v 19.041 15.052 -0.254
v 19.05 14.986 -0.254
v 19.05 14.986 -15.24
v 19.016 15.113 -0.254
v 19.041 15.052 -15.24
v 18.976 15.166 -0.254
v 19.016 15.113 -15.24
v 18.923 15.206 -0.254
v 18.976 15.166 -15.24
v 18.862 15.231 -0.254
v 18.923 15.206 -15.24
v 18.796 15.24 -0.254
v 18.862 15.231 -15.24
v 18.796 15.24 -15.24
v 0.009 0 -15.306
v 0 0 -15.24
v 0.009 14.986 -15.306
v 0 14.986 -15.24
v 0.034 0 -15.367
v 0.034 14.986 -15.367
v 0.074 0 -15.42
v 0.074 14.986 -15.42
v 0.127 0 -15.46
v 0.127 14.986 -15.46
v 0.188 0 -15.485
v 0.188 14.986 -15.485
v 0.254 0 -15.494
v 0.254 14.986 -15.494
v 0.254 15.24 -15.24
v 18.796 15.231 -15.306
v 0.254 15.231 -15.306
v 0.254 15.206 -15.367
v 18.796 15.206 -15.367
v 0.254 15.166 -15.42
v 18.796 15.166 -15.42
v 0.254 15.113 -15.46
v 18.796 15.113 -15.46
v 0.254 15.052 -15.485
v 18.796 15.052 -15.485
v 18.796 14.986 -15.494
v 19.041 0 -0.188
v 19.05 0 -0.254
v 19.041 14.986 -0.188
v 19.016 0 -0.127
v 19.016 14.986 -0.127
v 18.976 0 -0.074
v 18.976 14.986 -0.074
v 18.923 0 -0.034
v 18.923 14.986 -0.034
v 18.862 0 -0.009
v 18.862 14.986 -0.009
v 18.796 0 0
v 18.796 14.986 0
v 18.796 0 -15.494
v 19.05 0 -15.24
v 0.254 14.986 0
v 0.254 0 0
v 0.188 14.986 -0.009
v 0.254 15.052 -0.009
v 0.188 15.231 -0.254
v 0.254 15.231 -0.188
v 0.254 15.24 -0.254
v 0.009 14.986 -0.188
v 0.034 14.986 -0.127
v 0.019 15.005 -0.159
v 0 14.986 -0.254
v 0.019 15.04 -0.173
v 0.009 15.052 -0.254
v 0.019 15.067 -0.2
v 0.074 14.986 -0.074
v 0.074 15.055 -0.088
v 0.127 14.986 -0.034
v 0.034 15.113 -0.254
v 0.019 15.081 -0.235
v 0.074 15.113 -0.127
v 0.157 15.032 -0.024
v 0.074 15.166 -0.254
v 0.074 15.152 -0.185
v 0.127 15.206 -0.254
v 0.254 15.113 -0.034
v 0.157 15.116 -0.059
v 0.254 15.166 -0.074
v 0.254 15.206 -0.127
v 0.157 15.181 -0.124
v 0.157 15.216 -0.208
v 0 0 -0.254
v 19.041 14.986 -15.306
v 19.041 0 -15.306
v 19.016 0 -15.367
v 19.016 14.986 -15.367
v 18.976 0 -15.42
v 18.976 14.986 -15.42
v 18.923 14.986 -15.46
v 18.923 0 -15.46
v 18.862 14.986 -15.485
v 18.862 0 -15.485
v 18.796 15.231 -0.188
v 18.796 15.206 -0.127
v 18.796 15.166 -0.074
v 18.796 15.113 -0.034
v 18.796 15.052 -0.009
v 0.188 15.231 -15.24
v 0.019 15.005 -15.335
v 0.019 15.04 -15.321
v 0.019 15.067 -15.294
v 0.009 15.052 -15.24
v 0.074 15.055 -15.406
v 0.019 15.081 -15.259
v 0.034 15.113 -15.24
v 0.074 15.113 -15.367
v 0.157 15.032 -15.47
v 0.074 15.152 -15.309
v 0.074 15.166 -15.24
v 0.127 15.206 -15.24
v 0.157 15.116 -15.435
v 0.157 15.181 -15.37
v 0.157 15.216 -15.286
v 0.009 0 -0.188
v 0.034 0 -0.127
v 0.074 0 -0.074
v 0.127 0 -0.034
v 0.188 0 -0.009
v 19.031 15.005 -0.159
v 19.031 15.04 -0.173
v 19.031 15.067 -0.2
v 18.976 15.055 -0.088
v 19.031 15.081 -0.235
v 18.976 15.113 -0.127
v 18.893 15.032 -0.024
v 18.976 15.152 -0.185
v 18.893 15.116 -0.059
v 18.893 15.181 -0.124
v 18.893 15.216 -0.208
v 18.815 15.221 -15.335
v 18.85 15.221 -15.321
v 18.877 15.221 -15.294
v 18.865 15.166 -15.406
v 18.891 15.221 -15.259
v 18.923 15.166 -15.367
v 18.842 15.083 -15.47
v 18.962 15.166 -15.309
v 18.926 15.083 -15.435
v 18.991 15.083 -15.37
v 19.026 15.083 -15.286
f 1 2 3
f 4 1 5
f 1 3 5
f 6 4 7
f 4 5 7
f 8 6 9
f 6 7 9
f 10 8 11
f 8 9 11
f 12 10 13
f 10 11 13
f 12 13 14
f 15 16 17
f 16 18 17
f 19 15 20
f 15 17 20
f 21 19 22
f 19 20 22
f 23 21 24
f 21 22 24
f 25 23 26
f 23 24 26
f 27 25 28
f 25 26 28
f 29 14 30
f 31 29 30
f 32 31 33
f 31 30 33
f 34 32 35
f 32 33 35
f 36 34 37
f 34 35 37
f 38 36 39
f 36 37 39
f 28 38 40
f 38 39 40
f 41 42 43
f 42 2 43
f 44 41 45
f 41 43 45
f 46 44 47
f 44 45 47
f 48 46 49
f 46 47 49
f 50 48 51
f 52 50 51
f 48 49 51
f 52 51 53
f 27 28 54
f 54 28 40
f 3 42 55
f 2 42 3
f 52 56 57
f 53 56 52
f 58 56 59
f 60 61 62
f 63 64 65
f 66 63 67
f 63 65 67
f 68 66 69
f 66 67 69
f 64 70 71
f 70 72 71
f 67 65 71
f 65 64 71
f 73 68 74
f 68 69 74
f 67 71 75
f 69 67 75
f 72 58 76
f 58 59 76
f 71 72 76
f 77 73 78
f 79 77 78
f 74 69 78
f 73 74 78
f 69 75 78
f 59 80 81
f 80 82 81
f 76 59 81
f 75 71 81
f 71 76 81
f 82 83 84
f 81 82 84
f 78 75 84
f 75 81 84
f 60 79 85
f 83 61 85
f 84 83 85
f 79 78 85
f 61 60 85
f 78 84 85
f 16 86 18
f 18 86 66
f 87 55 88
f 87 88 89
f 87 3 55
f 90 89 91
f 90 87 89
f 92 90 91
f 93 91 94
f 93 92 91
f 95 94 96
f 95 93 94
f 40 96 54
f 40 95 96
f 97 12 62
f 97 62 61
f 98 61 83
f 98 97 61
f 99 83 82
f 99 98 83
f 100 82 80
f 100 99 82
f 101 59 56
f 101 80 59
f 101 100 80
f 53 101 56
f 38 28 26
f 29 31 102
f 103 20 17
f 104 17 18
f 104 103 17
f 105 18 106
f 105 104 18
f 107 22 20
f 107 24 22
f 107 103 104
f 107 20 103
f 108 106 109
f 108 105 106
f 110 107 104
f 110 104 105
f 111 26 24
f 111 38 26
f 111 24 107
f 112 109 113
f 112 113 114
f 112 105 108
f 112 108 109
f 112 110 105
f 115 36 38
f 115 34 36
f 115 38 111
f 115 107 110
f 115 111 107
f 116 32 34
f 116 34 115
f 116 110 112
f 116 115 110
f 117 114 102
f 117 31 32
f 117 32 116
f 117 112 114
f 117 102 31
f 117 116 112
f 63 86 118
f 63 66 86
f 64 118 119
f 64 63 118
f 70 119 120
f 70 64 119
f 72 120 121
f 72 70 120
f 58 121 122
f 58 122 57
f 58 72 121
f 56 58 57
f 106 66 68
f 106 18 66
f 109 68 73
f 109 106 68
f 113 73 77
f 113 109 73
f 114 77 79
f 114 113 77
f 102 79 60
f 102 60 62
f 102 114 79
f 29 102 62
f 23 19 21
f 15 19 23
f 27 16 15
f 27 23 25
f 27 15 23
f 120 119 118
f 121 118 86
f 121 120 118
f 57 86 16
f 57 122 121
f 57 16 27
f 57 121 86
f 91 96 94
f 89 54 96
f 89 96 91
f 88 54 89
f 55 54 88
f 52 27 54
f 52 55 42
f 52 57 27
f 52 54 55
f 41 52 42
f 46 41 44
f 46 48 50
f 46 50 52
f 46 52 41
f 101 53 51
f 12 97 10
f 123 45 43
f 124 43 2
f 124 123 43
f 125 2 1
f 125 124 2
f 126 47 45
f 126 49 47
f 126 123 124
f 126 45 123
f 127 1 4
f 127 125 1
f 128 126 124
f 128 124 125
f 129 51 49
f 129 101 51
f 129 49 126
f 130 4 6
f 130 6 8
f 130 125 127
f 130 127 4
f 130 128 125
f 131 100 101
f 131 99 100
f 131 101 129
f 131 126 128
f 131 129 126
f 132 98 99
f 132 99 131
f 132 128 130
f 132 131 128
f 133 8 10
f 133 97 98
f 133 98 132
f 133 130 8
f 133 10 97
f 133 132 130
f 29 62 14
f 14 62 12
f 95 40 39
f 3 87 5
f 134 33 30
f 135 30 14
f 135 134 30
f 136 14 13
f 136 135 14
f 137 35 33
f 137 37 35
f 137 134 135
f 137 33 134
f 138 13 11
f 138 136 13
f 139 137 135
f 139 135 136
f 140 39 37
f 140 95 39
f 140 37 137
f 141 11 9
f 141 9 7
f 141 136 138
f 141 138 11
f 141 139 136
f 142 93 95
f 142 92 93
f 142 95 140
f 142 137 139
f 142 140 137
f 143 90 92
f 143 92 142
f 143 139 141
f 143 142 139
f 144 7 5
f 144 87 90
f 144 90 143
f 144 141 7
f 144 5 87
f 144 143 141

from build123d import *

# Parameters (mm, degrees)
SKETCH_1_W      = 19.05
SKETCH_1_H      = 15.24
EXTRUDE_1_DEPTH = 15.494
FILLET_1_R      = 0.254


with BuildPart() as part:
    # 草图1 → 凸台-拉伸1 (new body)
    with BuildSketch(Plane.XY):
        with Locations((9.525, 7.62)):
            Rectangle(SKETCH_1_W, SKETCH_1_H)
    extrude(amount=-EXTRUDE_1_DEPTH)

    # 圆角1
    fillet_1_edges = [part.edges().sort_by_distance(p)[0] for p in [
        (19.05, 7.62, -15.494),
        (9.525, 15.24, -15.494),
        (0, 7.62, -15.494),
        (9.525, 15.24, 0),
        (19.05, 7.62, 0),
        (0, 7.62, 0),
        (0, 15.24, -7.747),
        (19.05, 15.24, -7.747),
    ]]
    fillet(fillet_1_edges, radius=FILLET_1_R)


solid = part.part
